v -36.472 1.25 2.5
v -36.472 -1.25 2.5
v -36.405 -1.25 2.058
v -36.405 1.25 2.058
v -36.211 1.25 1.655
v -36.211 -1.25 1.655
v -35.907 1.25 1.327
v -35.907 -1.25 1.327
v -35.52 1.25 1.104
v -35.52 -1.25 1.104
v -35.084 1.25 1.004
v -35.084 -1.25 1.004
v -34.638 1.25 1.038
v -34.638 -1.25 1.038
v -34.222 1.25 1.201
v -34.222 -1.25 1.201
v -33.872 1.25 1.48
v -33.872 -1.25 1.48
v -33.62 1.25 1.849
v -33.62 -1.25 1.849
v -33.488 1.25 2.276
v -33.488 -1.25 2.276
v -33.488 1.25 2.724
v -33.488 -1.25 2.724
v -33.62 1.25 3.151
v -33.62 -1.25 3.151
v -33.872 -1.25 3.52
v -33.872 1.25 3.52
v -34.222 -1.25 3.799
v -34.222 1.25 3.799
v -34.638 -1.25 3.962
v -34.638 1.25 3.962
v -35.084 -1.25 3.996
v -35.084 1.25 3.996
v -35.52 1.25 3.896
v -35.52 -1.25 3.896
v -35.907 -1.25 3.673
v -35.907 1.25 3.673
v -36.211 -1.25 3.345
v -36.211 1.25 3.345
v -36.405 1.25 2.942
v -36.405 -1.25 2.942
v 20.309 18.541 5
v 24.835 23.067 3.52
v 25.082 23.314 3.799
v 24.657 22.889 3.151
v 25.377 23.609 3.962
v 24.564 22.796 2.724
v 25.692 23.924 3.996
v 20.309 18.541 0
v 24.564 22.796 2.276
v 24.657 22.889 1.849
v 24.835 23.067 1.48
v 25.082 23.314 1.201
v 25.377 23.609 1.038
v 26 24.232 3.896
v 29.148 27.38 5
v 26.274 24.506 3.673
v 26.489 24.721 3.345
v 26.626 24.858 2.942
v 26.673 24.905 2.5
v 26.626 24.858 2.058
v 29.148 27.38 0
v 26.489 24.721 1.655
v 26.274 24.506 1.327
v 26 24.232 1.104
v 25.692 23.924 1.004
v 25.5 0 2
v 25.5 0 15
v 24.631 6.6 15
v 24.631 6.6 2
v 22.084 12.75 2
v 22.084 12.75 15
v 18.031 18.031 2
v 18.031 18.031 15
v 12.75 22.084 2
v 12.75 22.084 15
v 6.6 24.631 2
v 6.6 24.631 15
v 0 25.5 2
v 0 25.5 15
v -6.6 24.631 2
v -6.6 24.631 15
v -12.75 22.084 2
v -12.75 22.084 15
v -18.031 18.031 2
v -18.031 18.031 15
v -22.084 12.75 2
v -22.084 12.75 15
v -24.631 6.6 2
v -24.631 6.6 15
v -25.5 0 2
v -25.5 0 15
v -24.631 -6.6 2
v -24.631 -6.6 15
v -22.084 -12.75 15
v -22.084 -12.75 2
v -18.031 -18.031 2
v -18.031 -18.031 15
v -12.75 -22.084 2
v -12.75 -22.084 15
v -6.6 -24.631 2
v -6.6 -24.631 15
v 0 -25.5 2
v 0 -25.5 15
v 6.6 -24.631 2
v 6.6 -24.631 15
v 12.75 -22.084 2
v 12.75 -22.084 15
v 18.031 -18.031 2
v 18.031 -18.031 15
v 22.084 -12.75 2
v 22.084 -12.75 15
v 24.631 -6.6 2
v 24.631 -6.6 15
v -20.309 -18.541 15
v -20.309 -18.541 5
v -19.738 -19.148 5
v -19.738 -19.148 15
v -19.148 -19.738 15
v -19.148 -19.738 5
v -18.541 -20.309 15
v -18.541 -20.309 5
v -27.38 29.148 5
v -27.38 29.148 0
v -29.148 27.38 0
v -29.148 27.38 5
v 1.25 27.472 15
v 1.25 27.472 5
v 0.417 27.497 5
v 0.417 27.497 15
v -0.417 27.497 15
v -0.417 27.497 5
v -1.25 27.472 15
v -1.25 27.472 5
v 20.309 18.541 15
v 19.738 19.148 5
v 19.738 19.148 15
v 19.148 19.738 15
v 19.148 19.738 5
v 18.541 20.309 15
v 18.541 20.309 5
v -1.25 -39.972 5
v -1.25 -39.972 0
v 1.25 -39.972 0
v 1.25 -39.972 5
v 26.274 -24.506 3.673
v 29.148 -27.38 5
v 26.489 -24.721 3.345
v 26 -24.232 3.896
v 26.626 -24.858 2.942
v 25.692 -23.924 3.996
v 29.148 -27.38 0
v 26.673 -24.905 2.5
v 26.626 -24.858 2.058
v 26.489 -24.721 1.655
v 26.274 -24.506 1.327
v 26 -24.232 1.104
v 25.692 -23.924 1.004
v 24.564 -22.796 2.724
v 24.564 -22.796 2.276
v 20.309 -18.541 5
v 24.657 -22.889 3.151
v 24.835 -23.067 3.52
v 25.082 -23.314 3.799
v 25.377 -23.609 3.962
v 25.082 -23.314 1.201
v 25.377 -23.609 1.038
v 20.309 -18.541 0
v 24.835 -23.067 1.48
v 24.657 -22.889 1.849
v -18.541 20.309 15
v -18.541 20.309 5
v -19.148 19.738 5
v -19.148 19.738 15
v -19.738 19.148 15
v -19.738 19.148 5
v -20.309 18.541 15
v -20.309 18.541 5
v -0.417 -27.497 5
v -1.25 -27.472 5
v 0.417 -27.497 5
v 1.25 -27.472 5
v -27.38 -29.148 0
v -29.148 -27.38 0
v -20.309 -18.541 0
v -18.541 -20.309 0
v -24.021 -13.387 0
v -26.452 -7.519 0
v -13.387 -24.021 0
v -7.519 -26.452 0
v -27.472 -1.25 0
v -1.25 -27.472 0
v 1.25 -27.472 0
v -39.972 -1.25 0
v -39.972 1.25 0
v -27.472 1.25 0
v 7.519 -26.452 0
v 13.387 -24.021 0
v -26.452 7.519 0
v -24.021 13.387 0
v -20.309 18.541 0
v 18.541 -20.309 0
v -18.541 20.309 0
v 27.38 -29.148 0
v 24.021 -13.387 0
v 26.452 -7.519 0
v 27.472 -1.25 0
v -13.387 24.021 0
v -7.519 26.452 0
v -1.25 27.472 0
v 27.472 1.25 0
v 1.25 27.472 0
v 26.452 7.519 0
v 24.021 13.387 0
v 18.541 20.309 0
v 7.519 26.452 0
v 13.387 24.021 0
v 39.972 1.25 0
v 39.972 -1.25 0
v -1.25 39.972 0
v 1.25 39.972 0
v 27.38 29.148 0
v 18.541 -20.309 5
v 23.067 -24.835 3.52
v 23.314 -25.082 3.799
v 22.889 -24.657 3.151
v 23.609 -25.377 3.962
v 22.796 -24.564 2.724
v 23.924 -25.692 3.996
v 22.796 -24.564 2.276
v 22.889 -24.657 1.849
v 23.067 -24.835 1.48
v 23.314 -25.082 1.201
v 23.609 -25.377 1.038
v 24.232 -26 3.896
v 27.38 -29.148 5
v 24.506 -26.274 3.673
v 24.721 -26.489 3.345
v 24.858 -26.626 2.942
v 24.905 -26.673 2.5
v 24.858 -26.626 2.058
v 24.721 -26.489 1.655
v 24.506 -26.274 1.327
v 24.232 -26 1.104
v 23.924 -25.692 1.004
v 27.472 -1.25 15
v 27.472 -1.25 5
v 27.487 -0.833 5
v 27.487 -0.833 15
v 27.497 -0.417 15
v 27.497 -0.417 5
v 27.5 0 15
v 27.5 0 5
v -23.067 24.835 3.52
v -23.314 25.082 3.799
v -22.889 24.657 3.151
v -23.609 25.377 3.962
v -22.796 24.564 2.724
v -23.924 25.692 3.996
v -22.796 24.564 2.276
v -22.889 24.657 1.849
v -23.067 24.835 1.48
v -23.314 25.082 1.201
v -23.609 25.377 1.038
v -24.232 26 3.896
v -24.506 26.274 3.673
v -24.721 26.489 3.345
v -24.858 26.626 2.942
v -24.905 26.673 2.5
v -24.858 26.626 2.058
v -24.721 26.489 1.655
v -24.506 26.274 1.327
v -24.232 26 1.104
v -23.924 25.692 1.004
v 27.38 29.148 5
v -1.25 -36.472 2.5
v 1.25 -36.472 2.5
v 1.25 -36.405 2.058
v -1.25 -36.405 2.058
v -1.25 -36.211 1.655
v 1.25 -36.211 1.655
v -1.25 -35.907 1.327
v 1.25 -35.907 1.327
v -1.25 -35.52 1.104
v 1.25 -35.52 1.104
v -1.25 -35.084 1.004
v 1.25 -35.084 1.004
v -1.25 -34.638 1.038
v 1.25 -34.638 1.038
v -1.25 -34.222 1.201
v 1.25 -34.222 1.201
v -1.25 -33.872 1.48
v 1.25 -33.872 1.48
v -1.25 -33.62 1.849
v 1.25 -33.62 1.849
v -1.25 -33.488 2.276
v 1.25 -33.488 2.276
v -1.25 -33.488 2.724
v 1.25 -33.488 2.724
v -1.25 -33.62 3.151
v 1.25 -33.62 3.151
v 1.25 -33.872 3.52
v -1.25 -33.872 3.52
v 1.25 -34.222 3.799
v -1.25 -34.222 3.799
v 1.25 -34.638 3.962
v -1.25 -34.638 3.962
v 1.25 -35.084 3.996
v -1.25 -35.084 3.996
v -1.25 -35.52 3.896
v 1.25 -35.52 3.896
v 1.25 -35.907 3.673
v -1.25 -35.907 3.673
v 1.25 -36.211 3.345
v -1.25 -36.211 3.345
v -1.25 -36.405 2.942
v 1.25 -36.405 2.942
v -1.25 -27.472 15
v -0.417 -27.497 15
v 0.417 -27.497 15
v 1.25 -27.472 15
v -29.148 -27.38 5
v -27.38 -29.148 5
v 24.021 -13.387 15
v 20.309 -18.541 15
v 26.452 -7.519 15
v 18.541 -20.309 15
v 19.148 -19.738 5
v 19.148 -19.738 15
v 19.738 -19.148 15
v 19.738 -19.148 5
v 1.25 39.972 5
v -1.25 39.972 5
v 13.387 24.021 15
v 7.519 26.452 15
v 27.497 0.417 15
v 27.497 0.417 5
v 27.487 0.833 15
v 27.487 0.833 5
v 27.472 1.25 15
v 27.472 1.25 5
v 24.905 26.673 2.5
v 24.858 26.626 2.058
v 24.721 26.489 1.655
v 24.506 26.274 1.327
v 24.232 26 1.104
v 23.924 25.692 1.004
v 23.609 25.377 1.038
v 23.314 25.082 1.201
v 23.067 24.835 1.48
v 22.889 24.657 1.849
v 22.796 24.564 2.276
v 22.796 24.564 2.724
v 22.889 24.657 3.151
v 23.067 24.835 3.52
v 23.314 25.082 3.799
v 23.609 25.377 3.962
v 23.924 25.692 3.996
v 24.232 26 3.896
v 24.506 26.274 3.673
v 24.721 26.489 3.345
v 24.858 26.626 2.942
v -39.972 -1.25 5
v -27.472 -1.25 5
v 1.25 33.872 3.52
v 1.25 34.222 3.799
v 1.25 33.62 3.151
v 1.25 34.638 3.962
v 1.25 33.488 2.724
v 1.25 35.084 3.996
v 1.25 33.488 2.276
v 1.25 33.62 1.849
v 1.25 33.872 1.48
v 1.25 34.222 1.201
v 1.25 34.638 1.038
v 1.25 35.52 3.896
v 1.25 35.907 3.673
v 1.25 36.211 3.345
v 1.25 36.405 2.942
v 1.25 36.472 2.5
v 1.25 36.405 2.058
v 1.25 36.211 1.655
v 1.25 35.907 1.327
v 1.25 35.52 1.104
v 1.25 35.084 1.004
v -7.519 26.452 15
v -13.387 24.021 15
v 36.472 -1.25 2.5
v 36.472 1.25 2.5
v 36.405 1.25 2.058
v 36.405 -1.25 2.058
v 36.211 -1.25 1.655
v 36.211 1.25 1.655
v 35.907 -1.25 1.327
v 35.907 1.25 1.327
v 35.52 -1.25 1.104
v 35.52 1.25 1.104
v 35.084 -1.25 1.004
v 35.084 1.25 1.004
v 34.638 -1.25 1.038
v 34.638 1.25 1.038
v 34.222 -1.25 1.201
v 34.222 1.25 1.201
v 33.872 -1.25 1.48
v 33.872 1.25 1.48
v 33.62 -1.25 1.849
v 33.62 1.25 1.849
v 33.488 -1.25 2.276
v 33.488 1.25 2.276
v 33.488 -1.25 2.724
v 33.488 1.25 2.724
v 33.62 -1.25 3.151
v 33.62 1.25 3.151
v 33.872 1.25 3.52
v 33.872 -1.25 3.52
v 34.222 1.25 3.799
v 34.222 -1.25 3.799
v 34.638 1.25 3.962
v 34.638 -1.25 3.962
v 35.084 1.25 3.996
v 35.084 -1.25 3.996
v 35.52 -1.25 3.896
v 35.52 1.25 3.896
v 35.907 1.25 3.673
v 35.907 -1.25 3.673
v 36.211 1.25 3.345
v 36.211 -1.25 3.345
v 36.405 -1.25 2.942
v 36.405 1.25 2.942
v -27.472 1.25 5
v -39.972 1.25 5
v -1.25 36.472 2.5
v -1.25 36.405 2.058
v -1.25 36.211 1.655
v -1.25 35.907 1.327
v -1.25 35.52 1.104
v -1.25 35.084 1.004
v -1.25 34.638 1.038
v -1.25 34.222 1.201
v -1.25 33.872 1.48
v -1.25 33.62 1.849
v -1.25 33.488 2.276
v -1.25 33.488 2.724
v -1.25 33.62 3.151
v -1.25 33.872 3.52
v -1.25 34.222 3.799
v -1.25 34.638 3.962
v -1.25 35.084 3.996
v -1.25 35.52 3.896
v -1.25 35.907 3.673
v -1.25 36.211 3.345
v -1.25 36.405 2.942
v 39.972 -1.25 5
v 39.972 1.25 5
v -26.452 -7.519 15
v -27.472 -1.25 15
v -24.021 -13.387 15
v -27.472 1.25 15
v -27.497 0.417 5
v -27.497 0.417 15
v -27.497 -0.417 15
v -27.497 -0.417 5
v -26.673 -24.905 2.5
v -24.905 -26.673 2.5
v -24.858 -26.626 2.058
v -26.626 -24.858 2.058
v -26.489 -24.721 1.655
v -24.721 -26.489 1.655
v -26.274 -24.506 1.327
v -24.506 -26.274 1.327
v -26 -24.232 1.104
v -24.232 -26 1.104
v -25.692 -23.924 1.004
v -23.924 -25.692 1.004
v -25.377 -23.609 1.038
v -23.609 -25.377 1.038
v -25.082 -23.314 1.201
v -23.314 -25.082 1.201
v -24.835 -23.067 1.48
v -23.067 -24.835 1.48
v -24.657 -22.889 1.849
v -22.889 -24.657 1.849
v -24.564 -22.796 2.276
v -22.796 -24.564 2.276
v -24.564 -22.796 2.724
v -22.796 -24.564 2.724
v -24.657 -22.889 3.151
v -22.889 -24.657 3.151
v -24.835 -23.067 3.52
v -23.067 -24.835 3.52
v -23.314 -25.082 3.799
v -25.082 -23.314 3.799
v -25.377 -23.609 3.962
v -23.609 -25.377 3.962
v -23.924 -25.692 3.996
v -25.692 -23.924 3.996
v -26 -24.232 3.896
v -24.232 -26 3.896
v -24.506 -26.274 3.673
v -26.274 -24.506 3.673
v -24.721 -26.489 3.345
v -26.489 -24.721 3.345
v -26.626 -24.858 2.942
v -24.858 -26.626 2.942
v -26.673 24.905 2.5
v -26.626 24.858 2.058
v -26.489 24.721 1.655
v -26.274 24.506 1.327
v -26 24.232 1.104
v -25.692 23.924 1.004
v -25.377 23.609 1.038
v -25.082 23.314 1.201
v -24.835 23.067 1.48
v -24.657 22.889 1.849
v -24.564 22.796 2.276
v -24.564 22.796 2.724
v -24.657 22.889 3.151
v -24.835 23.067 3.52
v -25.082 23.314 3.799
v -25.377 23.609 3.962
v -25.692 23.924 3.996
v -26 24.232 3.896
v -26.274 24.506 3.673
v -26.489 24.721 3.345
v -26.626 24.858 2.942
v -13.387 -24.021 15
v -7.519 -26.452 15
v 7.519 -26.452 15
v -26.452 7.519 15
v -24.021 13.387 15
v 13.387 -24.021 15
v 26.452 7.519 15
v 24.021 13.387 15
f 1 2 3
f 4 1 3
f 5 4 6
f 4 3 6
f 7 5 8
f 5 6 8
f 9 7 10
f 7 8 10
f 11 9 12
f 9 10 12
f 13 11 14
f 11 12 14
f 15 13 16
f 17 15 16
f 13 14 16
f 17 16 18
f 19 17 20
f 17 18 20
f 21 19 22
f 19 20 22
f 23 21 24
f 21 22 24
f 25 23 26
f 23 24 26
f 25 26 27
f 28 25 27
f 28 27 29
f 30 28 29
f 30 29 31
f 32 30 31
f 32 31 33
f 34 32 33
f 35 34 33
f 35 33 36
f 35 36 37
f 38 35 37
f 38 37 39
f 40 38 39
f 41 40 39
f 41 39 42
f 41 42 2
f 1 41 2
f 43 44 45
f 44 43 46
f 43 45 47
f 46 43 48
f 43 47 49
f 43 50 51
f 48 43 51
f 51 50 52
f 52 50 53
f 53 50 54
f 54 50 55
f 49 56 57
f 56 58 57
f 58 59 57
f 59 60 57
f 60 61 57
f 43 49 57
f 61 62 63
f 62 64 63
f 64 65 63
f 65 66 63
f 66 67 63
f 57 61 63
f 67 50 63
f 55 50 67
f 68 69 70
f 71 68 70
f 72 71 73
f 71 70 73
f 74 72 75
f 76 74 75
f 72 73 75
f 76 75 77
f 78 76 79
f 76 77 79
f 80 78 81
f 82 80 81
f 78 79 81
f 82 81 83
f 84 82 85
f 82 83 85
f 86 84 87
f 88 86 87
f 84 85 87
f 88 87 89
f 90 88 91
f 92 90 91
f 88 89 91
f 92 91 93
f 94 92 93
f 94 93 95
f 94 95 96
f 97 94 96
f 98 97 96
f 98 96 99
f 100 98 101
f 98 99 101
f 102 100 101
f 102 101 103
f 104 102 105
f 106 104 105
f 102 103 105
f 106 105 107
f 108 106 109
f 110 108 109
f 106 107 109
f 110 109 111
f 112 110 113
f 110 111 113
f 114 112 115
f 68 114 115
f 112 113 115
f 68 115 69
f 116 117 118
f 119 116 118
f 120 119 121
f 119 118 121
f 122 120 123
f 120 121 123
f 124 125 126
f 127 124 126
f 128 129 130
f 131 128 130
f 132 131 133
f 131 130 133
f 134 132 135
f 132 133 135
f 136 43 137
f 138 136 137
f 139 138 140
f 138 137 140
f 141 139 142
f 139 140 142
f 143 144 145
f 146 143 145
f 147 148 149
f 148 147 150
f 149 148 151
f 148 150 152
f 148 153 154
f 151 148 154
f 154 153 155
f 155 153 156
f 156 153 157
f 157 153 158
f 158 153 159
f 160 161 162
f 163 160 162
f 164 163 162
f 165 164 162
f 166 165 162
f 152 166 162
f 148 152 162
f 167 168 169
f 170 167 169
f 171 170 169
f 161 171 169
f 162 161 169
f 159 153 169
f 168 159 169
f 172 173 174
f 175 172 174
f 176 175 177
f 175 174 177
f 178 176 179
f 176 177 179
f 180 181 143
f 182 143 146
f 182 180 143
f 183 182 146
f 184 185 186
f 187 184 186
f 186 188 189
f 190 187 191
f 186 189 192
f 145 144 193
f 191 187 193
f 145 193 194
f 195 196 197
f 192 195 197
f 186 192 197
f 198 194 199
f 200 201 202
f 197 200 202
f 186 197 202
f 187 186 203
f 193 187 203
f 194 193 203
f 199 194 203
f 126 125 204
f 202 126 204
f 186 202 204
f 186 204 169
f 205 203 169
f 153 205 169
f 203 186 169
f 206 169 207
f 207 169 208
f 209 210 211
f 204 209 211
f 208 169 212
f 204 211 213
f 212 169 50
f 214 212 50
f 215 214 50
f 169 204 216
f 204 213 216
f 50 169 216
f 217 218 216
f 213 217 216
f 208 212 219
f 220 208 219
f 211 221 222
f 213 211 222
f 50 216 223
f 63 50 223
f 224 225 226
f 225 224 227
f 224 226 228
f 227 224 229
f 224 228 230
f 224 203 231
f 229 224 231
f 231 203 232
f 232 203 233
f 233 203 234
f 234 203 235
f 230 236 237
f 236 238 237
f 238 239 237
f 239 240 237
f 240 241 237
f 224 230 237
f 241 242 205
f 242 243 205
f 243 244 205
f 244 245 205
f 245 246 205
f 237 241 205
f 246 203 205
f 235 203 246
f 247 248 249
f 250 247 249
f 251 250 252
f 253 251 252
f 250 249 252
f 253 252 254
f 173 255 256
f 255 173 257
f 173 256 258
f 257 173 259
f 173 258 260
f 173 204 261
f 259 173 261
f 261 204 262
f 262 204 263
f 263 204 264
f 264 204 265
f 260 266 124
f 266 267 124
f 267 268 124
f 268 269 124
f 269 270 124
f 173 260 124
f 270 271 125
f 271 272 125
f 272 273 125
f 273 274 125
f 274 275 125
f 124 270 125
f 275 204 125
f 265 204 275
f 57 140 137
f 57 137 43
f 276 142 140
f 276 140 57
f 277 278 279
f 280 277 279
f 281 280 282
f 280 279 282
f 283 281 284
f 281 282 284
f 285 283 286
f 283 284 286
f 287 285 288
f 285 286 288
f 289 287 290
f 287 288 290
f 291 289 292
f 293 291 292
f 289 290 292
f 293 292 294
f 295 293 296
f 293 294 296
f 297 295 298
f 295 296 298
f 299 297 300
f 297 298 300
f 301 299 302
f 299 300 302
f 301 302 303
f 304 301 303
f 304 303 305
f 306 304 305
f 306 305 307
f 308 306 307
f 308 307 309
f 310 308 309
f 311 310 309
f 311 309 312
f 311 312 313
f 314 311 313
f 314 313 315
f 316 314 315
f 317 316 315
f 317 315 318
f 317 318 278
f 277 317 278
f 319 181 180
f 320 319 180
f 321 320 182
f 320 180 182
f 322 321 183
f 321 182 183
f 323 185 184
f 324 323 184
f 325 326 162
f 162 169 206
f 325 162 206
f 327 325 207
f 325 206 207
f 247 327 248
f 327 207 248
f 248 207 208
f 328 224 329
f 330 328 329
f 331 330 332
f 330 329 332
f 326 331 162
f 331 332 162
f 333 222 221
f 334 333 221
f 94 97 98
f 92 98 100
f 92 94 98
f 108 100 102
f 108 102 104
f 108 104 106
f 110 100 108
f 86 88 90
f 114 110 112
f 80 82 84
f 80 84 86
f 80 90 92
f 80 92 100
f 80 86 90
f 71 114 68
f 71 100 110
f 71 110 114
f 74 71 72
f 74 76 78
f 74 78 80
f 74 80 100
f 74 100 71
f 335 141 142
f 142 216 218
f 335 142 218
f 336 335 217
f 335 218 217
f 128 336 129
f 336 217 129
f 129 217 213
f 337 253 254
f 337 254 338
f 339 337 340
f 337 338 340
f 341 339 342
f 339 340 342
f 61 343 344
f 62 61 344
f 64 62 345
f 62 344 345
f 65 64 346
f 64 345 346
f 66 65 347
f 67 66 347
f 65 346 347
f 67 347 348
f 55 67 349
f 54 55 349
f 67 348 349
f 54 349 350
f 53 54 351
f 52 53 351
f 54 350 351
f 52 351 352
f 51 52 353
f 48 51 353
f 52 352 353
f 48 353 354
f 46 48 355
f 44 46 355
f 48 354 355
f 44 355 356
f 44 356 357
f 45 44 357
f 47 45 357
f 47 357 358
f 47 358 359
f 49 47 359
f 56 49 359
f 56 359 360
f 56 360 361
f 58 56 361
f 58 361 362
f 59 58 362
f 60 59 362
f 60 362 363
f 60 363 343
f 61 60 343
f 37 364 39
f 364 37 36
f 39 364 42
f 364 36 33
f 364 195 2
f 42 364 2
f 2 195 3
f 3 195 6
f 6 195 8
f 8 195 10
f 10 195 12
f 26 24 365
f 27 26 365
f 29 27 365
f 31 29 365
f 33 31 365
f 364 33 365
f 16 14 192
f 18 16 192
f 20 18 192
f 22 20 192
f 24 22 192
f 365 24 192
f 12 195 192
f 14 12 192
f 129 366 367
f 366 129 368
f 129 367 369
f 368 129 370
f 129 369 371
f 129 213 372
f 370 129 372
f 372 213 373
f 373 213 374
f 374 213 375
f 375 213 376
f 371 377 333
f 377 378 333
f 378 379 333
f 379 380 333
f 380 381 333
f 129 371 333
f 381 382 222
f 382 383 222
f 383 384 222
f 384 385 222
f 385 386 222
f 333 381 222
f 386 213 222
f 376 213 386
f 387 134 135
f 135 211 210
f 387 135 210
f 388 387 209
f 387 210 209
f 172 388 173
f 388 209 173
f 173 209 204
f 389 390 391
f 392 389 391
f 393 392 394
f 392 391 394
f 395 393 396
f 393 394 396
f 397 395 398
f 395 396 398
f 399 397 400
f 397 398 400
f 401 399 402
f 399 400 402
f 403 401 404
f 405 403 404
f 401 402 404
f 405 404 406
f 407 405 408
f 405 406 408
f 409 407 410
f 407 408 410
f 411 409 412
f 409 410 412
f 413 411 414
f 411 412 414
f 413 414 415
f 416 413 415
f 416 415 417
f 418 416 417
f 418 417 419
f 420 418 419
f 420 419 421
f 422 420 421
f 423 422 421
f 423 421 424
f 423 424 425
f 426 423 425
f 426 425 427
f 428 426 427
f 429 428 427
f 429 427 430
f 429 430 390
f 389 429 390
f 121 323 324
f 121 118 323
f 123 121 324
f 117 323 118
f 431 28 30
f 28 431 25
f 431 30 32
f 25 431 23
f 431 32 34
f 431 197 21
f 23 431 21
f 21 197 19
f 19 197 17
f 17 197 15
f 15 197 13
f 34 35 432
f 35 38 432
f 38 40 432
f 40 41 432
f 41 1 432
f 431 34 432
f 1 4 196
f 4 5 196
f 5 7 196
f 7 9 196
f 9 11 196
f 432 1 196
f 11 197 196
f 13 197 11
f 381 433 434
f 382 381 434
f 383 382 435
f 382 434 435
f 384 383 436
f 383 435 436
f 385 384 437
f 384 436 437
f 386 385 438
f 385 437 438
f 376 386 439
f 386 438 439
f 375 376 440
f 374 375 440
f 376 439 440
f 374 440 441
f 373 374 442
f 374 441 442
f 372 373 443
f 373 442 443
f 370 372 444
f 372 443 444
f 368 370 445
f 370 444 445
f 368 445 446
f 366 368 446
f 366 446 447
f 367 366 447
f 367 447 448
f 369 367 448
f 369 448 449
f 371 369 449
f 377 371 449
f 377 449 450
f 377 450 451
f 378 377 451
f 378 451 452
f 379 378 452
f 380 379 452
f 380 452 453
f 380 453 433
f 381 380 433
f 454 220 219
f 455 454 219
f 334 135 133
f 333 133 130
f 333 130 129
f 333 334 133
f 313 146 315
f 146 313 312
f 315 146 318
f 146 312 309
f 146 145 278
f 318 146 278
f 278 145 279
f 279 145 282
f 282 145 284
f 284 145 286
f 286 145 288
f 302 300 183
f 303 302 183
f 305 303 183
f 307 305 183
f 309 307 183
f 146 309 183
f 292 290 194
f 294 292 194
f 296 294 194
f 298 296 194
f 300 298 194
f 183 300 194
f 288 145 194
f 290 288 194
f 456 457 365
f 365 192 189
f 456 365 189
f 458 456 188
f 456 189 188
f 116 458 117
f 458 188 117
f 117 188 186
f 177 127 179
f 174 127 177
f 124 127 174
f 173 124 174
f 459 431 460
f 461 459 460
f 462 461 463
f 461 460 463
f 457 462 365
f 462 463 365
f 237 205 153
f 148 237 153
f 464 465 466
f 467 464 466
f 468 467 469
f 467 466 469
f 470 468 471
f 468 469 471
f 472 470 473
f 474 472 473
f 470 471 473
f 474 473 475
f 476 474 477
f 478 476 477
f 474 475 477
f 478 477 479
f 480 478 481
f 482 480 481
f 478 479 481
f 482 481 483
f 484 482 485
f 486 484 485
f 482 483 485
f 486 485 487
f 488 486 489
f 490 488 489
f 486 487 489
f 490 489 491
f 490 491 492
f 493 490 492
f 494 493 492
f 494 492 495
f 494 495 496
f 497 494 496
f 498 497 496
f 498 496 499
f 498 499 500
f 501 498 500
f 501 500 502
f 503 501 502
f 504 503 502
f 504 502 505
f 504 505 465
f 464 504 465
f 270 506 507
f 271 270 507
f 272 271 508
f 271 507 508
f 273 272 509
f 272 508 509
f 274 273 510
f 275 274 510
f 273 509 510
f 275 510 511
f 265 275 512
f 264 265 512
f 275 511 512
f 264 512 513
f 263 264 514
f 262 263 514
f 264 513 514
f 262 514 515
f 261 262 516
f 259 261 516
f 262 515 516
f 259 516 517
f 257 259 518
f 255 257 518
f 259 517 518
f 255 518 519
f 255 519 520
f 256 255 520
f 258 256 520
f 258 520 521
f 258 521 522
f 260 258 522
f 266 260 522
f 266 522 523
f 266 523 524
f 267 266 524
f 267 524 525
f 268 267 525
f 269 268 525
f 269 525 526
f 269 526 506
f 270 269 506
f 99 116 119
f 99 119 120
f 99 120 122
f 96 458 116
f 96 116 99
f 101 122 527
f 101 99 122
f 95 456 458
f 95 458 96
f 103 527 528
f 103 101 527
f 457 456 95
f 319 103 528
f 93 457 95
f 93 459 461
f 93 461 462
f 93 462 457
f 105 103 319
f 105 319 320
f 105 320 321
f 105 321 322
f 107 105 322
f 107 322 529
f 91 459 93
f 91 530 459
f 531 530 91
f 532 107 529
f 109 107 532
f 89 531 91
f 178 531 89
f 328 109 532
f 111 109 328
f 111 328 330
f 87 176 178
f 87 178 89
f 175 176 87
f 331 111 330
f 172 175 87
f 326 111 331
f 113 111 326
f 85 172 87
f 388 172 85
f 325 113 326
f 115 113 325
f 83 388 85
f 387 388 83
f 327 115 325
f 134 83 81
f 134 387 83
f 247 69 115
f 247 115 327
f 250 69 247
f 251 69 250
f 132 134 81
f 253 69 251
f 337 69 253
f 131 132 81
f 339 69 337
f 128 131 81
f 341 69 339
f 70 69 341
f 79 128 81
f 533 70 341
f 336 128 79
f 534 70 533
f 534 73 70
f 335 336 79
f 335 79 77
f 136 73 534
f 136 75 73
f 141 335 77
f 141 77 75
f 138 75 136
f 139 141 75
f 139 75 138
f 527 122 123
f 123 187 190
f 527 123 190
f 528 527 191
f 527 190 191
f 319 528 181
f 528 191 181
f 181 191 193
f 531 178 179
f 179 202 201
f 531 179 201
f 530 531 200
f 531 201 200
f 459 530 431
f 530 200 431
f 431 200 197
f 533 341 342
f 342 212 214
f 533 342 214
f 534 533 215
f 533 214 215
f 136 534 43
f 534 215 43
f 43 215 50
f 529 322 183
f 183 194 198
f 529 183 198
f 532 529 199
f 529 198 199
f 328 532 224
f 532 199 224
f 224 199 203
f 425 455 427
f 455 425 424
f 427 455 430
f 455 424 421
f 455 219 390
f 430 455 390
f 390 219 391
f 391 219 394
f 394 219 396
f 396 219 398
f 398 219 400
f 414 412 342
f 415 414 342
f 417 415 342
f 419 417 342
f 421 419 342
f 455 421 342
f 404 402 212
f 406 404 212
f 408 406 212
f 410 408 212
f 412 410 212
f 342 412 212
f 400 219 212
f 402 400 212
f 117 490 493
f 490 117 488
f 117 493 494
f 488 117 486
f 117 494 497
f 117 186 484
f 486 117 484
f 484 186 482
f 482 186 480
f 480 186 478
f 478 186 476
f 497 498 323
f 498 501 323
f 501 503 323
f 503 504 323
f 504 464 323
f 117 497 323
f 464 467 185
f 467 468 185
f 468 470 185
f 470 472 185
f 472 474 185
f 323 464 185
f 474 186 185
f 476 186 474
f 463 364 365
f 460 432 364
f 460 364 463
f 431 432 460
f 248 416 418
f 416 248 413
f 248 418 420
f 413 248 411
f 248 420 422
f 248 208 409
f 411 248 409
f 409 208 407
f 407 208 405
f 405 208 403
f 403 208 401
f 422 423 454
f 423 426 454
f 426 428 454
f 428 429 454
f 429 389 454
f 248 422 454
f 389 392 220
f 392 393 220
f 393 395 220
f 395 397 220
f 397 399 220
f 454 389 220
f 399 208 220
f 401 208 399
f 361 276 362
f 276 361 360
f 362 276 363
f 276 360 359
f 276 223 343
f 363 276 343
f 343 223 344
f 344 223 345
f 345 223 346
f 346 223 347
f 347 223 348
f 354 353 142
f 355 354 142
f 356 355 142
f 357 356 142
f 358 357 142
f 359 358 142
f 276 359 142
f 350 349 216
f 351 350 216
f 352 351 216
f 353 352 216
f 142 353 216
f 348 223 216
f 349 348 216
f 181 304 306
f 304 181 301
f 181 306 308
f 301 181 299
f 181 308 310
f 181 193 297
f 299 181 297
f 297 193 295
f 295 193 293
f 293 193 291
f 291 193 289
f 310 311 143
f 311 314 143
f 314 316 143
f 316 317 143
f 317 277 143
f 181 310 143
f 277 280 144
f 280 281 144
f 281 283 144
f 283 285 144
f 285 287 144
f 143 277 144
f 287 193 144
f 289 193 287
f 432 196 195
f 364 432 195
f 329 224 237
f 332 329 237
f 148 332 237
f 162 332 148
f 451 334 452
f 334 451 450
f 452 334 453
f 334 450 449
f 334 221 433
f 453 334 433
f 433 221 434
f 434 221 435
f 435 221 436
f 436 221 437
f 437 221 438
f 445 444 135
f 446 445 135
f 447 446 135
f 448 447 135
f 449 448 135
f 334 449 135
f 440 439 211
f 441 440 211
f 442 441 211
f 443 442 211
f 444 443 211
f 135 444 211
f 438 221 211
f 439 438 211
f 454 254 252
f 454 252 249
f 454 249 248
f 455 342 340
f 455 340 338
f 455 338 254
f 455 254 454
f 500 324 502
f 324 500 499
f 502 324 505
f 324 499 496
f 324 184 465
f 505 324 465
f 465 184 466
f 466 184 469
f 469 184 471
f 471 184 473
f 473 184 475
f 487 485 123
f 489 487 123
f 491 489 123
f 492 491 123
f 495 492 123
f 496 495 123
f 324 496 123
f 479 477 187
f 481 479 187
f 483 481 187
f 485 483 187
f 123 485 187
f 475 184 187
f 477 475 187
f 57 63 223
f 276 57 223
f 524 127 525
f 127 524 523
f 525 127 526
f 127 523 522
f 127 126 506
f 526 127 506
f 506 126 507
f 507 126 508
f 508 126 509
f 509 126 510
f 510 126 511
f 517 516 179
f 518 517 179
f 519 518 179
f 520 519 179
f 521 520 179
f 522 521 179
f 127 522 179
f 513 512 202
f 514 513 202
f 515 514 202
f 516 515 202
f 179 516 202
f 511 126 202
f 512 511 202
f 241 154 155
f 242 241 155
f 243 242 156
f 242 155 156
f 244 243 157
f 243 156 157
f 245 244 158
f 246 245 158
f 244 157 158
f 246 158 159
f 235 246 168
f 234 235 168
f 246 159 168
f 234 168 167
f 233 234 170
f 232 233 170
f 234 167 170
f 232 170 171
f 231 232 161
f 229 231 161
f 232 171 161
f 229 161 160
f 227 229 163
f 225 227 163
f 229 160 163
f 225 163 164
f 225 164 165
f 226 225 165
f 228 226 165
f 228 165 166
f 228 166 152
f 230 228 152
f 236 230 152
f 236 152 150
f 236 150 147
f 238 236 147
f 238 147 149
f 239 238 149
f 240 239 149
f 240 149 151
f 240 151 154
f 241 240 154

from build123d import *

# Parameters (mm, degrees)
F1_DEPTH  = 15
F2_R      = 25.5
F3_DEPTH  = 13
F4_DEPTH  = 5
F6_DEPTH  = 25
F8_DEPTH  = 25
F10_DEPTH = 25
F12_DEPTH = 25
F14_DEPTH = 25
F16_DEPTH = 25
F18_DEPTH = 25
F20_DEPTH = 25


with BuildPart() as f1:
    # F0 (on Top) → F1 (new body)
    with BuildSketch(Plane.XY):
        with BuildLine():
            ThreePointArc((27.4715762198, -1.25), (27.4928931366, -0.6251615614), (27.5, 0))
            ThreePointArc((27.5, 0), (27.4928931366, 0.6251615614), (27.4715762198, 1.25))
            ThreePointArc((27.4715762198, 1.25), (25.4066871441, 10.52379439), (20.3092213114, 18.5414543584))
            ThreePointArc((20.3092213114, 18.5414543584), (19.4454364826, 19.4454364826), (18.5414543584, 20.3092213114))
            ThreePointArc((18.5414543584, 20.3092213114), (10.52379439, 25.4066871441), (1.25, 27.4715762198))
            ThreePointArc((1.25, 27.4715762198), (0, 27.5), (-1.25, 27.4715762198))
            ThreePointArc((-1.25, 27.4715762198), (-10.52379439, 25.4066871441), (-18.5414543584, 20.3092213114))
            ThreePointArc((-18.5414543584, 20.3092213114), (-19.4454364826, 19.4454364826), (-20.3092213114, 18.5414543584))
            ThreePointArc((-20.3092213114, 18.5414543584), (-25.4066871441, 10.52379439), (-27.4715762198, 1.25))
            ThreePointArc((-27.4715762198, 1.25), (-27.5, 0), (-27.4715762198, -1.25))
            ThreePointArc((-27.4715762198, -1.25), (-25.4066871441, -10.52379439), (-20.3092213114, -18.5414543584))
            ThreePointArc((-20.3092213114, -18.5414543584), (-19.4454364826, -19.4454364826), (-18.5414543584, -20.3092213114))
            ThreePointArc((-18.5414543584, -20.3092213114), (-10.52379439, -25.4066871441), (-1.25, -27.4715762198))
            ThreePointArc((-1.25, -27.4715762198), (0, -27.5), (1.25, -27.4715762198))
            ThreePointArc((1.25, -27.4715762198), (10.52379439, -25.4066871441), (18.5414543584, -20.3092213114))
            ThreePointArc((18.5414543584, -20.3092213114), (19.4454364826, -19.4454364826), (20.3092213114, -18.5414543584))
            ThreePointArc((20.3092213114, -18.5414543584), (25.4066871441, -10.52379439), (27.4715762198, -1.25))
        make_face()
    extrude(amount=F1_DEPTH)

    # F2 (on face) → F3 (cut)
    with BuildSketch(Plane.XY.offset(15)):
        Circle(F2_R)
    extrude(amount=-F3_DEPTH, mode=Mode.SUBTRACT)

    # F0 (on Top) → F4 (join)
    with BuildSketch(Plane.XY):
        with BuildLine():
            ThreePointArc((-1.25, 27.4715762198), (0, 27.5), (1.25, 27.4715762198))
            Line((1.25, 27.4715762198), (1.25, 39.9715762198))
            Line((1.25, 39.9715762198), (-1.25, 39.9715762198))
            Line((-1.25, 39.9715762198), (-1.25, 27.4715762198))
        make_face()
        with BuildLine():
            ThreePointArc((-20.3092213114, 18.5414543584), (-19.4454364826, 19.4454364826), (-18.5414543584, 20.3092213114))
            Line((-18.5414543584, 20.3092213114), (-27.3802891232, 29.1480560762))
            Line((-27.3802891232, 29.1480560762), (-29.1480560762, 27.3802891232))
            Line((-29.1480560762, 27.3802891232), (-20.3092213114, 18.5414543584))
        make_face()
        with BuildLine():
            ThreePointArc((-27.4715762198, -1.25), (-27.5, 0), (-27.4715762198, 1.25))
            Line((-27.4715762198, 1.25), (-39.9715762198, 1.25))
            Line((-39.9715762198, 1.25), (-39.9715762198, -1.25))
            Line((-39.9715762198, -1.25), (-27.4715762198, -1.25))
        make_face()
        with BuildLine():
            Line((-27.3802891232, -29.1480560762), (-18.5414543584, -20.3092213114))
            ThreePointArc((-18.5414543584, -20.3092213114), (-19.4454364826, -19.4454364826), (-20.3092213114, -18.5414543584))
            Line((-20.3092213114, -18.5414543584), (-29.1480560762, -27.3802891232))
            Line((-29.1480560762, -27.3802891232), (-27.3802891232, -29.1480560762))
        make_face()
        with BuildLine():
            Line((1.25, -39.9715762198), (1.25, -27.4715762198))
            ThreePointArc((1.25, -27.4715762198), (0, -27.5), (-1.25, -27.4715762198))
            Line((-1.25, -27.4715762198), (-1.25, -39.9715762198))
            Line((-1.25, -39.9715762198), (1.25, -39.9715762198))
        make_face()
        with BuildLine():
            Line((29.1480560762, -27.3802891232), (20.3092213114, -18.5414543584))
            ThreePointArc((20.3092213114, -18.5414543584), (19.4454364826, -19.4454364826), (18.5414543584, -20.3092213114))
            Line((18.5414543584, -20.3092213114), (27.3802891232, -29.1480560762))
            Line((27.3802891232, -29.1480560762), (29.1480560762, -27.3802891232))
        make_face()
        with BuildLine():
            ThreePointArc((27.4715762198, 1.25), (27.4928931366, 0.6251615614), (27.5, 0))
            ThreePointArc((27.5, 0), (27.4928931366, -0.6251615614), (27.4715762198, -1.25))
            Line((27.4715762198, -1.25), (39.9715762198, -1.25))
            Line((39.9715762198, -1.25), (39.9715762198, 1.25))
            Line((39.9715762198, 1.25), (27.4715762198, 1.25))
        make_face()
        with BuildLine():
            ThreePointArc((18.5414543584, 20.3092213114), (19.4454364826, 19.4454364826), (20.3092213114, 18.5414543584))
            Line((20.3092213114, 18.5414543584), (29.1480560762, 27.3802891232))
            Line((29.1480560762, 27.3802891232), (27.3802891232, 29.1480560762))
            Line((27.3802891232, 29.1480560762), (18.5414543584, 20.3092213114))
        make_face()
    extrude(amount=F4_DEPTH)

    # F5 (on face) → F6 (cut)
    with BuildSketch(Plane.YZ.offset(1.25)):
        with BuildLine():
            ThreePointArc((-33.4715762198, 2.5), (-34.9715762198, 4), (-36.4715762198, 2.5))
            ThreePointArc((-36.4715762198, 2.5), (-34.9715762198, 1), (-33.4715762198, 2.5))
        make_face()
    extrude(amount=-F6_DEPTH, mode=Mode.SUBTRACT)

    # F7 (on face) → F8 (cut)
    with BuildSketch(Plane(origin=(0.8838834765, -0.8838834765, 0), x_dir=(0.7071067812, 0.7071067812, 0), z_dir=(0.7071067812, -0.7071067812, 0))):
        with BuildLine():
            ThreePointArc((-33.4715762198, 2.5), (-34.9715762198, 4), (-36.4715762198, 2.5))
            ThreePointArc((-36.4715762198, 2.5), (-34.9715762198, 1), (-33.4715762198, 2.5))
        make_face()
    extrude(amount=-F8_DEPTH, mode=Mode.SUBTRACT)

    # F9 (on face) → F10 (cut)
    with BuildSketch(Plane.XZ.offset(1.25)):
        with BuildLine():
            ThreePointArc((-33.4715762198, 2.5), (-34.9715762198, 4), (-36.4715762198, 2.5))
            ThreePointArc((-36.4715762198, 2.5), (-34.9715762198, 1), (-33.4715762198, 2.5))
        make_face()
    extrude(amount=-F10_DEPTH, mode=Mode.SUBTRACT)

    # F11 (on face) → F12 (cut)
    with BuildSketch(Plane(origin=(-0.8838834765, -0.8838834765, 0), x_dir=(0.7071067812, -0.7071067812, 0), z_dir=(-0.7071067812, -0.7071067812, 0))):
        with BuildLine():
            ThreePointArc((-33.4715762198, 2.5), (-34.9715762198, 4), (-36.4715762198, 2.5))
            ThreePointArc((-36.4715762198, 2.5), (-34.9715762198, 1), (-33.4715762198, 2.5))
        make_face()
    extrude(amount=-F12_DEPTH, mode=Mode.SUBTRACT)

    # F13 (on face) → F14 (cut)
    with BuildSketch(Plane(origin=(-1.25, 0, 0), x_dir=(0, -1, 0), z_dir=(-1, 0, 0))):
        with BuildLine():
            ThreePointArc((-33.4715762198, 2.5), (-34.9715762198, 4), (-36.4715762198, 2.5))
            ThreePointArc((-36.4715762198, 2.5), (-34.9715762198, 1), (-33.4715762198, 2.5))
        make_face()
    extrude(amount=-F14_DEPTH, mode=Mode.SUBTRACT)

    # F15 (on face) → F16 (cut)
    with BuildSketch(Plane(origin=(-0.8838834765, 0.8838834765, 0), x_dir=(-0.7071067812, -0.7071067812, 0), z_dir=(-0.7071067812, 0.7071067812, 0))):
        with BuildLine():
            ThreePointArc((-33.4715762198, 2.5), (-34.9715762198, 4), (-36.4715762198, 2.5))
            ThreePointArc((-36.4715762198, 2.5), (-34.9715762198, 1), (-33.4715762198, 2.5))
        make_face()
    extrude(amount=-F16_DEPTH, mode=Mode.SUBTRACT)

    # F17 (on face) → F18 (cut)
    with BuildSketch(Plane(origin=(0, 1.25, 0), x_dir=(-1, 0, 0), z_dir=(0, 1, 0))):
        with BuildLine():
            ThreePointArc((-33.4715762198, 2.5), (-34.9715762198, 4), (-36.4715762198, 2.5))
            ThreePointArc((-36.4715762198, 2.5), (-34.9715762198, 1), (-33.4715762198, 2.5))
        make_face()
    extrude(amount=-F18_DEPTH, mode=Mode.SUBTRACT)

    # F19 (on face) → F20 (cut)
    with BuildSketch(Plane(origin=(0.8838834765, 0.8838834765, 0), x_dir=(-0.7071067812, 0.7071067812, 0), z_dir=(0.7071067812, 0.7071067812, 0))):
        with BuildLine():
            ThreePointArc((-33.4715762198, 2.5), (-34.9715762198, 4), (-36.4715762198, 2.5))
            ThreePointArc((-36.4715762198, 2.5), (-34.9715762198, 1), (-33.4715762198, 2.5))
        make_face()
    extrude(amount=-F20_DEPTH, mode=Mode.SUBTRACT)


solid = f1.part
